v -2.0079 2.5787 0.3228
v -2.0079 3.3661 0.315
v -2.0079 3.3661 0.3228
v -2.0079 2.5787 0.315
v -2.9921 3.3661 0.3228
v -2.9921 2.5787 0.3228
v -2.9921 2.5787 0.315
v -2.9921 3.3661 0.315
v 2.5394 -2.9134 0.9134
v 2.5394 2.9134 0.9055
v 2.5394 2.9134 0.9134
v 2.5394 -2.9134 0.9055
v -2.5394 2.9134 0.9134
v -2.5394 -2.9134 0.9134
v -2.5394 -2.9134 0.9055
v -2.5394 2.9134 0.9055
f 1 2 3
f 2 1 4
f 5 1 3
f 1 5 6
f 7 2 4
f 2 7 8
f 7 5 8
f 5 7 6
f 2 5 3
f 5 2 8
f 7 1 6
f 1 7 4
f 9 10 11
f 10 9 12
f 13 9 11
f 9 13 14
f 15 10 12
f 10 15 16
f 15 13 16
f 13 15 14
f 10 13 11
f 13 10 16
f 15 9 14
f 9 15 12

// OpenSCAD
// file: defines.scad
// example012.stl is Mblock.stl, (c) 2009 Will Langford
// licensed under the Creative Commons - GNU GPL license.
// http://www.thingiverse.com/thing:753

//import("sim800c.stl", convexity=3);

// PCB

w = 15.7;
h = 17.6;
pin_fragments = 16;

scale = 1/2.54;
// main file
// example012.stl is Mblock.stl, (c) 2009 Will Langford
// licensed under the Creative Commons - GNU GPL license.
// http://www.thingiverse.com/thing:753

//import("sim800c.stl", convexity=3);

// PCB

include <defines.scad>

// Pin#1 marker

color("White")
  scale(scale)
  translate([-w/2 + 0.25,   h/2 - 2.25,  0.8])
    cube(size = [2.5, 2, 0.02], center = false);

// Label

color("White")
  scale(scale)
  translate([-12.9/2, -14.8/2, 2.3])
    cube(size = [12.9, 14.8, 0.02], center = false);
